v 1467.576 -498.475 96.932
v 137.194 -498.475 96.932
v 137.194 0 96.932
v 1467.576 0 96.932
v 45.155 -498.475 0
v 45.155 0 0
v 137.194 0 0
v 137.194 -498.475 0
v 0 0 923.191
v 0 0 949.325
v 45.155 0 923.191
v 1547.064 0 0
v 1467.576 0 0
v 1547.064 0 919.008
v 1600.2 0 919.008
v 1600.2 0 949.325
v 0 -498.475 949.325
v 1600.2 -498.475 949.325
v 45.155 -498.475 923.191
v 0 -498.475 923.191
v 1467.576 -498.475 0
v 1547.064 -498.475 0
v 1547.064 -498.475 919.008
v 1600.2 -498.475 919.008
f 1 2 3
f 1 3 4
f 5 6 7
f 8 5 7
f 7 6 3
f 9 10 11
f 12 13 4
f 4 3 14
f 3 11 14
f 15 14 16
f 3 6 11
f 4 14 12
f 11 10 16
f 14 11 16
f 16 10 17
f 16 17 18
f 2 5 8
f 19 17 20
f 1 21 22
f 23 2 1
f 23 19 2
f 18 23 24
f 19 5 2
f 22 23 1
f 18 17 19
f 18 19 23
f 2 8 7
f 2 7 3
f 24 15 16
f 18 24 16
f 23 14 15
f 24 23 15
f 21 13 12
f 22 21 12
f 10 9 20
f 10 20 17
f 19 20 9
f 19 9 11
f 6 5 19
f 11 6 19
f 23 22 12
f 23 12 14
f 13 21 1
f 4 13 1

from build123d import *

# Parameters (mm, degrees)
F0_W     = 1600.2
F0_H     = 949.325
F1_DEPTH = 498.475
F2_W     = 45.155082
F2_H     = 923.191488
F2_W_2   = 53.135934
F2_H_2   = 919.007897
F2_W_3   = 1330.381736
F2_H_3   = 96.932329
F3_DEPTH = 508


with BuildPart() as f1:
    # F0 (on Front) → F1 (new body)
    with BuildSketch(Plane.XZ):
        with Locations((800.1, 474.6625)):
            Rectangle(F0_W, F0_H)
    extrude(amount=F1_DEPTH)

    # F2 (on face) → F3 (cut)
    with BuildSketch(Plane.XZ.offset(498.475)):
        with Locations((22.577541, 461.595744)):
            Rectangle(F2_W, F2_H)
        with Locations((1573.632033, 459.503948)):
            Rectangle(F2_W_2, F2_H_2)
        with Locations((802.38492, 48.466164)):
            Rectangle(F2_W_3, F2_H_3)
    extrude(amount=-F3_DEPTH, mode=Mode.SUBTRACT)


solid = f1.part
